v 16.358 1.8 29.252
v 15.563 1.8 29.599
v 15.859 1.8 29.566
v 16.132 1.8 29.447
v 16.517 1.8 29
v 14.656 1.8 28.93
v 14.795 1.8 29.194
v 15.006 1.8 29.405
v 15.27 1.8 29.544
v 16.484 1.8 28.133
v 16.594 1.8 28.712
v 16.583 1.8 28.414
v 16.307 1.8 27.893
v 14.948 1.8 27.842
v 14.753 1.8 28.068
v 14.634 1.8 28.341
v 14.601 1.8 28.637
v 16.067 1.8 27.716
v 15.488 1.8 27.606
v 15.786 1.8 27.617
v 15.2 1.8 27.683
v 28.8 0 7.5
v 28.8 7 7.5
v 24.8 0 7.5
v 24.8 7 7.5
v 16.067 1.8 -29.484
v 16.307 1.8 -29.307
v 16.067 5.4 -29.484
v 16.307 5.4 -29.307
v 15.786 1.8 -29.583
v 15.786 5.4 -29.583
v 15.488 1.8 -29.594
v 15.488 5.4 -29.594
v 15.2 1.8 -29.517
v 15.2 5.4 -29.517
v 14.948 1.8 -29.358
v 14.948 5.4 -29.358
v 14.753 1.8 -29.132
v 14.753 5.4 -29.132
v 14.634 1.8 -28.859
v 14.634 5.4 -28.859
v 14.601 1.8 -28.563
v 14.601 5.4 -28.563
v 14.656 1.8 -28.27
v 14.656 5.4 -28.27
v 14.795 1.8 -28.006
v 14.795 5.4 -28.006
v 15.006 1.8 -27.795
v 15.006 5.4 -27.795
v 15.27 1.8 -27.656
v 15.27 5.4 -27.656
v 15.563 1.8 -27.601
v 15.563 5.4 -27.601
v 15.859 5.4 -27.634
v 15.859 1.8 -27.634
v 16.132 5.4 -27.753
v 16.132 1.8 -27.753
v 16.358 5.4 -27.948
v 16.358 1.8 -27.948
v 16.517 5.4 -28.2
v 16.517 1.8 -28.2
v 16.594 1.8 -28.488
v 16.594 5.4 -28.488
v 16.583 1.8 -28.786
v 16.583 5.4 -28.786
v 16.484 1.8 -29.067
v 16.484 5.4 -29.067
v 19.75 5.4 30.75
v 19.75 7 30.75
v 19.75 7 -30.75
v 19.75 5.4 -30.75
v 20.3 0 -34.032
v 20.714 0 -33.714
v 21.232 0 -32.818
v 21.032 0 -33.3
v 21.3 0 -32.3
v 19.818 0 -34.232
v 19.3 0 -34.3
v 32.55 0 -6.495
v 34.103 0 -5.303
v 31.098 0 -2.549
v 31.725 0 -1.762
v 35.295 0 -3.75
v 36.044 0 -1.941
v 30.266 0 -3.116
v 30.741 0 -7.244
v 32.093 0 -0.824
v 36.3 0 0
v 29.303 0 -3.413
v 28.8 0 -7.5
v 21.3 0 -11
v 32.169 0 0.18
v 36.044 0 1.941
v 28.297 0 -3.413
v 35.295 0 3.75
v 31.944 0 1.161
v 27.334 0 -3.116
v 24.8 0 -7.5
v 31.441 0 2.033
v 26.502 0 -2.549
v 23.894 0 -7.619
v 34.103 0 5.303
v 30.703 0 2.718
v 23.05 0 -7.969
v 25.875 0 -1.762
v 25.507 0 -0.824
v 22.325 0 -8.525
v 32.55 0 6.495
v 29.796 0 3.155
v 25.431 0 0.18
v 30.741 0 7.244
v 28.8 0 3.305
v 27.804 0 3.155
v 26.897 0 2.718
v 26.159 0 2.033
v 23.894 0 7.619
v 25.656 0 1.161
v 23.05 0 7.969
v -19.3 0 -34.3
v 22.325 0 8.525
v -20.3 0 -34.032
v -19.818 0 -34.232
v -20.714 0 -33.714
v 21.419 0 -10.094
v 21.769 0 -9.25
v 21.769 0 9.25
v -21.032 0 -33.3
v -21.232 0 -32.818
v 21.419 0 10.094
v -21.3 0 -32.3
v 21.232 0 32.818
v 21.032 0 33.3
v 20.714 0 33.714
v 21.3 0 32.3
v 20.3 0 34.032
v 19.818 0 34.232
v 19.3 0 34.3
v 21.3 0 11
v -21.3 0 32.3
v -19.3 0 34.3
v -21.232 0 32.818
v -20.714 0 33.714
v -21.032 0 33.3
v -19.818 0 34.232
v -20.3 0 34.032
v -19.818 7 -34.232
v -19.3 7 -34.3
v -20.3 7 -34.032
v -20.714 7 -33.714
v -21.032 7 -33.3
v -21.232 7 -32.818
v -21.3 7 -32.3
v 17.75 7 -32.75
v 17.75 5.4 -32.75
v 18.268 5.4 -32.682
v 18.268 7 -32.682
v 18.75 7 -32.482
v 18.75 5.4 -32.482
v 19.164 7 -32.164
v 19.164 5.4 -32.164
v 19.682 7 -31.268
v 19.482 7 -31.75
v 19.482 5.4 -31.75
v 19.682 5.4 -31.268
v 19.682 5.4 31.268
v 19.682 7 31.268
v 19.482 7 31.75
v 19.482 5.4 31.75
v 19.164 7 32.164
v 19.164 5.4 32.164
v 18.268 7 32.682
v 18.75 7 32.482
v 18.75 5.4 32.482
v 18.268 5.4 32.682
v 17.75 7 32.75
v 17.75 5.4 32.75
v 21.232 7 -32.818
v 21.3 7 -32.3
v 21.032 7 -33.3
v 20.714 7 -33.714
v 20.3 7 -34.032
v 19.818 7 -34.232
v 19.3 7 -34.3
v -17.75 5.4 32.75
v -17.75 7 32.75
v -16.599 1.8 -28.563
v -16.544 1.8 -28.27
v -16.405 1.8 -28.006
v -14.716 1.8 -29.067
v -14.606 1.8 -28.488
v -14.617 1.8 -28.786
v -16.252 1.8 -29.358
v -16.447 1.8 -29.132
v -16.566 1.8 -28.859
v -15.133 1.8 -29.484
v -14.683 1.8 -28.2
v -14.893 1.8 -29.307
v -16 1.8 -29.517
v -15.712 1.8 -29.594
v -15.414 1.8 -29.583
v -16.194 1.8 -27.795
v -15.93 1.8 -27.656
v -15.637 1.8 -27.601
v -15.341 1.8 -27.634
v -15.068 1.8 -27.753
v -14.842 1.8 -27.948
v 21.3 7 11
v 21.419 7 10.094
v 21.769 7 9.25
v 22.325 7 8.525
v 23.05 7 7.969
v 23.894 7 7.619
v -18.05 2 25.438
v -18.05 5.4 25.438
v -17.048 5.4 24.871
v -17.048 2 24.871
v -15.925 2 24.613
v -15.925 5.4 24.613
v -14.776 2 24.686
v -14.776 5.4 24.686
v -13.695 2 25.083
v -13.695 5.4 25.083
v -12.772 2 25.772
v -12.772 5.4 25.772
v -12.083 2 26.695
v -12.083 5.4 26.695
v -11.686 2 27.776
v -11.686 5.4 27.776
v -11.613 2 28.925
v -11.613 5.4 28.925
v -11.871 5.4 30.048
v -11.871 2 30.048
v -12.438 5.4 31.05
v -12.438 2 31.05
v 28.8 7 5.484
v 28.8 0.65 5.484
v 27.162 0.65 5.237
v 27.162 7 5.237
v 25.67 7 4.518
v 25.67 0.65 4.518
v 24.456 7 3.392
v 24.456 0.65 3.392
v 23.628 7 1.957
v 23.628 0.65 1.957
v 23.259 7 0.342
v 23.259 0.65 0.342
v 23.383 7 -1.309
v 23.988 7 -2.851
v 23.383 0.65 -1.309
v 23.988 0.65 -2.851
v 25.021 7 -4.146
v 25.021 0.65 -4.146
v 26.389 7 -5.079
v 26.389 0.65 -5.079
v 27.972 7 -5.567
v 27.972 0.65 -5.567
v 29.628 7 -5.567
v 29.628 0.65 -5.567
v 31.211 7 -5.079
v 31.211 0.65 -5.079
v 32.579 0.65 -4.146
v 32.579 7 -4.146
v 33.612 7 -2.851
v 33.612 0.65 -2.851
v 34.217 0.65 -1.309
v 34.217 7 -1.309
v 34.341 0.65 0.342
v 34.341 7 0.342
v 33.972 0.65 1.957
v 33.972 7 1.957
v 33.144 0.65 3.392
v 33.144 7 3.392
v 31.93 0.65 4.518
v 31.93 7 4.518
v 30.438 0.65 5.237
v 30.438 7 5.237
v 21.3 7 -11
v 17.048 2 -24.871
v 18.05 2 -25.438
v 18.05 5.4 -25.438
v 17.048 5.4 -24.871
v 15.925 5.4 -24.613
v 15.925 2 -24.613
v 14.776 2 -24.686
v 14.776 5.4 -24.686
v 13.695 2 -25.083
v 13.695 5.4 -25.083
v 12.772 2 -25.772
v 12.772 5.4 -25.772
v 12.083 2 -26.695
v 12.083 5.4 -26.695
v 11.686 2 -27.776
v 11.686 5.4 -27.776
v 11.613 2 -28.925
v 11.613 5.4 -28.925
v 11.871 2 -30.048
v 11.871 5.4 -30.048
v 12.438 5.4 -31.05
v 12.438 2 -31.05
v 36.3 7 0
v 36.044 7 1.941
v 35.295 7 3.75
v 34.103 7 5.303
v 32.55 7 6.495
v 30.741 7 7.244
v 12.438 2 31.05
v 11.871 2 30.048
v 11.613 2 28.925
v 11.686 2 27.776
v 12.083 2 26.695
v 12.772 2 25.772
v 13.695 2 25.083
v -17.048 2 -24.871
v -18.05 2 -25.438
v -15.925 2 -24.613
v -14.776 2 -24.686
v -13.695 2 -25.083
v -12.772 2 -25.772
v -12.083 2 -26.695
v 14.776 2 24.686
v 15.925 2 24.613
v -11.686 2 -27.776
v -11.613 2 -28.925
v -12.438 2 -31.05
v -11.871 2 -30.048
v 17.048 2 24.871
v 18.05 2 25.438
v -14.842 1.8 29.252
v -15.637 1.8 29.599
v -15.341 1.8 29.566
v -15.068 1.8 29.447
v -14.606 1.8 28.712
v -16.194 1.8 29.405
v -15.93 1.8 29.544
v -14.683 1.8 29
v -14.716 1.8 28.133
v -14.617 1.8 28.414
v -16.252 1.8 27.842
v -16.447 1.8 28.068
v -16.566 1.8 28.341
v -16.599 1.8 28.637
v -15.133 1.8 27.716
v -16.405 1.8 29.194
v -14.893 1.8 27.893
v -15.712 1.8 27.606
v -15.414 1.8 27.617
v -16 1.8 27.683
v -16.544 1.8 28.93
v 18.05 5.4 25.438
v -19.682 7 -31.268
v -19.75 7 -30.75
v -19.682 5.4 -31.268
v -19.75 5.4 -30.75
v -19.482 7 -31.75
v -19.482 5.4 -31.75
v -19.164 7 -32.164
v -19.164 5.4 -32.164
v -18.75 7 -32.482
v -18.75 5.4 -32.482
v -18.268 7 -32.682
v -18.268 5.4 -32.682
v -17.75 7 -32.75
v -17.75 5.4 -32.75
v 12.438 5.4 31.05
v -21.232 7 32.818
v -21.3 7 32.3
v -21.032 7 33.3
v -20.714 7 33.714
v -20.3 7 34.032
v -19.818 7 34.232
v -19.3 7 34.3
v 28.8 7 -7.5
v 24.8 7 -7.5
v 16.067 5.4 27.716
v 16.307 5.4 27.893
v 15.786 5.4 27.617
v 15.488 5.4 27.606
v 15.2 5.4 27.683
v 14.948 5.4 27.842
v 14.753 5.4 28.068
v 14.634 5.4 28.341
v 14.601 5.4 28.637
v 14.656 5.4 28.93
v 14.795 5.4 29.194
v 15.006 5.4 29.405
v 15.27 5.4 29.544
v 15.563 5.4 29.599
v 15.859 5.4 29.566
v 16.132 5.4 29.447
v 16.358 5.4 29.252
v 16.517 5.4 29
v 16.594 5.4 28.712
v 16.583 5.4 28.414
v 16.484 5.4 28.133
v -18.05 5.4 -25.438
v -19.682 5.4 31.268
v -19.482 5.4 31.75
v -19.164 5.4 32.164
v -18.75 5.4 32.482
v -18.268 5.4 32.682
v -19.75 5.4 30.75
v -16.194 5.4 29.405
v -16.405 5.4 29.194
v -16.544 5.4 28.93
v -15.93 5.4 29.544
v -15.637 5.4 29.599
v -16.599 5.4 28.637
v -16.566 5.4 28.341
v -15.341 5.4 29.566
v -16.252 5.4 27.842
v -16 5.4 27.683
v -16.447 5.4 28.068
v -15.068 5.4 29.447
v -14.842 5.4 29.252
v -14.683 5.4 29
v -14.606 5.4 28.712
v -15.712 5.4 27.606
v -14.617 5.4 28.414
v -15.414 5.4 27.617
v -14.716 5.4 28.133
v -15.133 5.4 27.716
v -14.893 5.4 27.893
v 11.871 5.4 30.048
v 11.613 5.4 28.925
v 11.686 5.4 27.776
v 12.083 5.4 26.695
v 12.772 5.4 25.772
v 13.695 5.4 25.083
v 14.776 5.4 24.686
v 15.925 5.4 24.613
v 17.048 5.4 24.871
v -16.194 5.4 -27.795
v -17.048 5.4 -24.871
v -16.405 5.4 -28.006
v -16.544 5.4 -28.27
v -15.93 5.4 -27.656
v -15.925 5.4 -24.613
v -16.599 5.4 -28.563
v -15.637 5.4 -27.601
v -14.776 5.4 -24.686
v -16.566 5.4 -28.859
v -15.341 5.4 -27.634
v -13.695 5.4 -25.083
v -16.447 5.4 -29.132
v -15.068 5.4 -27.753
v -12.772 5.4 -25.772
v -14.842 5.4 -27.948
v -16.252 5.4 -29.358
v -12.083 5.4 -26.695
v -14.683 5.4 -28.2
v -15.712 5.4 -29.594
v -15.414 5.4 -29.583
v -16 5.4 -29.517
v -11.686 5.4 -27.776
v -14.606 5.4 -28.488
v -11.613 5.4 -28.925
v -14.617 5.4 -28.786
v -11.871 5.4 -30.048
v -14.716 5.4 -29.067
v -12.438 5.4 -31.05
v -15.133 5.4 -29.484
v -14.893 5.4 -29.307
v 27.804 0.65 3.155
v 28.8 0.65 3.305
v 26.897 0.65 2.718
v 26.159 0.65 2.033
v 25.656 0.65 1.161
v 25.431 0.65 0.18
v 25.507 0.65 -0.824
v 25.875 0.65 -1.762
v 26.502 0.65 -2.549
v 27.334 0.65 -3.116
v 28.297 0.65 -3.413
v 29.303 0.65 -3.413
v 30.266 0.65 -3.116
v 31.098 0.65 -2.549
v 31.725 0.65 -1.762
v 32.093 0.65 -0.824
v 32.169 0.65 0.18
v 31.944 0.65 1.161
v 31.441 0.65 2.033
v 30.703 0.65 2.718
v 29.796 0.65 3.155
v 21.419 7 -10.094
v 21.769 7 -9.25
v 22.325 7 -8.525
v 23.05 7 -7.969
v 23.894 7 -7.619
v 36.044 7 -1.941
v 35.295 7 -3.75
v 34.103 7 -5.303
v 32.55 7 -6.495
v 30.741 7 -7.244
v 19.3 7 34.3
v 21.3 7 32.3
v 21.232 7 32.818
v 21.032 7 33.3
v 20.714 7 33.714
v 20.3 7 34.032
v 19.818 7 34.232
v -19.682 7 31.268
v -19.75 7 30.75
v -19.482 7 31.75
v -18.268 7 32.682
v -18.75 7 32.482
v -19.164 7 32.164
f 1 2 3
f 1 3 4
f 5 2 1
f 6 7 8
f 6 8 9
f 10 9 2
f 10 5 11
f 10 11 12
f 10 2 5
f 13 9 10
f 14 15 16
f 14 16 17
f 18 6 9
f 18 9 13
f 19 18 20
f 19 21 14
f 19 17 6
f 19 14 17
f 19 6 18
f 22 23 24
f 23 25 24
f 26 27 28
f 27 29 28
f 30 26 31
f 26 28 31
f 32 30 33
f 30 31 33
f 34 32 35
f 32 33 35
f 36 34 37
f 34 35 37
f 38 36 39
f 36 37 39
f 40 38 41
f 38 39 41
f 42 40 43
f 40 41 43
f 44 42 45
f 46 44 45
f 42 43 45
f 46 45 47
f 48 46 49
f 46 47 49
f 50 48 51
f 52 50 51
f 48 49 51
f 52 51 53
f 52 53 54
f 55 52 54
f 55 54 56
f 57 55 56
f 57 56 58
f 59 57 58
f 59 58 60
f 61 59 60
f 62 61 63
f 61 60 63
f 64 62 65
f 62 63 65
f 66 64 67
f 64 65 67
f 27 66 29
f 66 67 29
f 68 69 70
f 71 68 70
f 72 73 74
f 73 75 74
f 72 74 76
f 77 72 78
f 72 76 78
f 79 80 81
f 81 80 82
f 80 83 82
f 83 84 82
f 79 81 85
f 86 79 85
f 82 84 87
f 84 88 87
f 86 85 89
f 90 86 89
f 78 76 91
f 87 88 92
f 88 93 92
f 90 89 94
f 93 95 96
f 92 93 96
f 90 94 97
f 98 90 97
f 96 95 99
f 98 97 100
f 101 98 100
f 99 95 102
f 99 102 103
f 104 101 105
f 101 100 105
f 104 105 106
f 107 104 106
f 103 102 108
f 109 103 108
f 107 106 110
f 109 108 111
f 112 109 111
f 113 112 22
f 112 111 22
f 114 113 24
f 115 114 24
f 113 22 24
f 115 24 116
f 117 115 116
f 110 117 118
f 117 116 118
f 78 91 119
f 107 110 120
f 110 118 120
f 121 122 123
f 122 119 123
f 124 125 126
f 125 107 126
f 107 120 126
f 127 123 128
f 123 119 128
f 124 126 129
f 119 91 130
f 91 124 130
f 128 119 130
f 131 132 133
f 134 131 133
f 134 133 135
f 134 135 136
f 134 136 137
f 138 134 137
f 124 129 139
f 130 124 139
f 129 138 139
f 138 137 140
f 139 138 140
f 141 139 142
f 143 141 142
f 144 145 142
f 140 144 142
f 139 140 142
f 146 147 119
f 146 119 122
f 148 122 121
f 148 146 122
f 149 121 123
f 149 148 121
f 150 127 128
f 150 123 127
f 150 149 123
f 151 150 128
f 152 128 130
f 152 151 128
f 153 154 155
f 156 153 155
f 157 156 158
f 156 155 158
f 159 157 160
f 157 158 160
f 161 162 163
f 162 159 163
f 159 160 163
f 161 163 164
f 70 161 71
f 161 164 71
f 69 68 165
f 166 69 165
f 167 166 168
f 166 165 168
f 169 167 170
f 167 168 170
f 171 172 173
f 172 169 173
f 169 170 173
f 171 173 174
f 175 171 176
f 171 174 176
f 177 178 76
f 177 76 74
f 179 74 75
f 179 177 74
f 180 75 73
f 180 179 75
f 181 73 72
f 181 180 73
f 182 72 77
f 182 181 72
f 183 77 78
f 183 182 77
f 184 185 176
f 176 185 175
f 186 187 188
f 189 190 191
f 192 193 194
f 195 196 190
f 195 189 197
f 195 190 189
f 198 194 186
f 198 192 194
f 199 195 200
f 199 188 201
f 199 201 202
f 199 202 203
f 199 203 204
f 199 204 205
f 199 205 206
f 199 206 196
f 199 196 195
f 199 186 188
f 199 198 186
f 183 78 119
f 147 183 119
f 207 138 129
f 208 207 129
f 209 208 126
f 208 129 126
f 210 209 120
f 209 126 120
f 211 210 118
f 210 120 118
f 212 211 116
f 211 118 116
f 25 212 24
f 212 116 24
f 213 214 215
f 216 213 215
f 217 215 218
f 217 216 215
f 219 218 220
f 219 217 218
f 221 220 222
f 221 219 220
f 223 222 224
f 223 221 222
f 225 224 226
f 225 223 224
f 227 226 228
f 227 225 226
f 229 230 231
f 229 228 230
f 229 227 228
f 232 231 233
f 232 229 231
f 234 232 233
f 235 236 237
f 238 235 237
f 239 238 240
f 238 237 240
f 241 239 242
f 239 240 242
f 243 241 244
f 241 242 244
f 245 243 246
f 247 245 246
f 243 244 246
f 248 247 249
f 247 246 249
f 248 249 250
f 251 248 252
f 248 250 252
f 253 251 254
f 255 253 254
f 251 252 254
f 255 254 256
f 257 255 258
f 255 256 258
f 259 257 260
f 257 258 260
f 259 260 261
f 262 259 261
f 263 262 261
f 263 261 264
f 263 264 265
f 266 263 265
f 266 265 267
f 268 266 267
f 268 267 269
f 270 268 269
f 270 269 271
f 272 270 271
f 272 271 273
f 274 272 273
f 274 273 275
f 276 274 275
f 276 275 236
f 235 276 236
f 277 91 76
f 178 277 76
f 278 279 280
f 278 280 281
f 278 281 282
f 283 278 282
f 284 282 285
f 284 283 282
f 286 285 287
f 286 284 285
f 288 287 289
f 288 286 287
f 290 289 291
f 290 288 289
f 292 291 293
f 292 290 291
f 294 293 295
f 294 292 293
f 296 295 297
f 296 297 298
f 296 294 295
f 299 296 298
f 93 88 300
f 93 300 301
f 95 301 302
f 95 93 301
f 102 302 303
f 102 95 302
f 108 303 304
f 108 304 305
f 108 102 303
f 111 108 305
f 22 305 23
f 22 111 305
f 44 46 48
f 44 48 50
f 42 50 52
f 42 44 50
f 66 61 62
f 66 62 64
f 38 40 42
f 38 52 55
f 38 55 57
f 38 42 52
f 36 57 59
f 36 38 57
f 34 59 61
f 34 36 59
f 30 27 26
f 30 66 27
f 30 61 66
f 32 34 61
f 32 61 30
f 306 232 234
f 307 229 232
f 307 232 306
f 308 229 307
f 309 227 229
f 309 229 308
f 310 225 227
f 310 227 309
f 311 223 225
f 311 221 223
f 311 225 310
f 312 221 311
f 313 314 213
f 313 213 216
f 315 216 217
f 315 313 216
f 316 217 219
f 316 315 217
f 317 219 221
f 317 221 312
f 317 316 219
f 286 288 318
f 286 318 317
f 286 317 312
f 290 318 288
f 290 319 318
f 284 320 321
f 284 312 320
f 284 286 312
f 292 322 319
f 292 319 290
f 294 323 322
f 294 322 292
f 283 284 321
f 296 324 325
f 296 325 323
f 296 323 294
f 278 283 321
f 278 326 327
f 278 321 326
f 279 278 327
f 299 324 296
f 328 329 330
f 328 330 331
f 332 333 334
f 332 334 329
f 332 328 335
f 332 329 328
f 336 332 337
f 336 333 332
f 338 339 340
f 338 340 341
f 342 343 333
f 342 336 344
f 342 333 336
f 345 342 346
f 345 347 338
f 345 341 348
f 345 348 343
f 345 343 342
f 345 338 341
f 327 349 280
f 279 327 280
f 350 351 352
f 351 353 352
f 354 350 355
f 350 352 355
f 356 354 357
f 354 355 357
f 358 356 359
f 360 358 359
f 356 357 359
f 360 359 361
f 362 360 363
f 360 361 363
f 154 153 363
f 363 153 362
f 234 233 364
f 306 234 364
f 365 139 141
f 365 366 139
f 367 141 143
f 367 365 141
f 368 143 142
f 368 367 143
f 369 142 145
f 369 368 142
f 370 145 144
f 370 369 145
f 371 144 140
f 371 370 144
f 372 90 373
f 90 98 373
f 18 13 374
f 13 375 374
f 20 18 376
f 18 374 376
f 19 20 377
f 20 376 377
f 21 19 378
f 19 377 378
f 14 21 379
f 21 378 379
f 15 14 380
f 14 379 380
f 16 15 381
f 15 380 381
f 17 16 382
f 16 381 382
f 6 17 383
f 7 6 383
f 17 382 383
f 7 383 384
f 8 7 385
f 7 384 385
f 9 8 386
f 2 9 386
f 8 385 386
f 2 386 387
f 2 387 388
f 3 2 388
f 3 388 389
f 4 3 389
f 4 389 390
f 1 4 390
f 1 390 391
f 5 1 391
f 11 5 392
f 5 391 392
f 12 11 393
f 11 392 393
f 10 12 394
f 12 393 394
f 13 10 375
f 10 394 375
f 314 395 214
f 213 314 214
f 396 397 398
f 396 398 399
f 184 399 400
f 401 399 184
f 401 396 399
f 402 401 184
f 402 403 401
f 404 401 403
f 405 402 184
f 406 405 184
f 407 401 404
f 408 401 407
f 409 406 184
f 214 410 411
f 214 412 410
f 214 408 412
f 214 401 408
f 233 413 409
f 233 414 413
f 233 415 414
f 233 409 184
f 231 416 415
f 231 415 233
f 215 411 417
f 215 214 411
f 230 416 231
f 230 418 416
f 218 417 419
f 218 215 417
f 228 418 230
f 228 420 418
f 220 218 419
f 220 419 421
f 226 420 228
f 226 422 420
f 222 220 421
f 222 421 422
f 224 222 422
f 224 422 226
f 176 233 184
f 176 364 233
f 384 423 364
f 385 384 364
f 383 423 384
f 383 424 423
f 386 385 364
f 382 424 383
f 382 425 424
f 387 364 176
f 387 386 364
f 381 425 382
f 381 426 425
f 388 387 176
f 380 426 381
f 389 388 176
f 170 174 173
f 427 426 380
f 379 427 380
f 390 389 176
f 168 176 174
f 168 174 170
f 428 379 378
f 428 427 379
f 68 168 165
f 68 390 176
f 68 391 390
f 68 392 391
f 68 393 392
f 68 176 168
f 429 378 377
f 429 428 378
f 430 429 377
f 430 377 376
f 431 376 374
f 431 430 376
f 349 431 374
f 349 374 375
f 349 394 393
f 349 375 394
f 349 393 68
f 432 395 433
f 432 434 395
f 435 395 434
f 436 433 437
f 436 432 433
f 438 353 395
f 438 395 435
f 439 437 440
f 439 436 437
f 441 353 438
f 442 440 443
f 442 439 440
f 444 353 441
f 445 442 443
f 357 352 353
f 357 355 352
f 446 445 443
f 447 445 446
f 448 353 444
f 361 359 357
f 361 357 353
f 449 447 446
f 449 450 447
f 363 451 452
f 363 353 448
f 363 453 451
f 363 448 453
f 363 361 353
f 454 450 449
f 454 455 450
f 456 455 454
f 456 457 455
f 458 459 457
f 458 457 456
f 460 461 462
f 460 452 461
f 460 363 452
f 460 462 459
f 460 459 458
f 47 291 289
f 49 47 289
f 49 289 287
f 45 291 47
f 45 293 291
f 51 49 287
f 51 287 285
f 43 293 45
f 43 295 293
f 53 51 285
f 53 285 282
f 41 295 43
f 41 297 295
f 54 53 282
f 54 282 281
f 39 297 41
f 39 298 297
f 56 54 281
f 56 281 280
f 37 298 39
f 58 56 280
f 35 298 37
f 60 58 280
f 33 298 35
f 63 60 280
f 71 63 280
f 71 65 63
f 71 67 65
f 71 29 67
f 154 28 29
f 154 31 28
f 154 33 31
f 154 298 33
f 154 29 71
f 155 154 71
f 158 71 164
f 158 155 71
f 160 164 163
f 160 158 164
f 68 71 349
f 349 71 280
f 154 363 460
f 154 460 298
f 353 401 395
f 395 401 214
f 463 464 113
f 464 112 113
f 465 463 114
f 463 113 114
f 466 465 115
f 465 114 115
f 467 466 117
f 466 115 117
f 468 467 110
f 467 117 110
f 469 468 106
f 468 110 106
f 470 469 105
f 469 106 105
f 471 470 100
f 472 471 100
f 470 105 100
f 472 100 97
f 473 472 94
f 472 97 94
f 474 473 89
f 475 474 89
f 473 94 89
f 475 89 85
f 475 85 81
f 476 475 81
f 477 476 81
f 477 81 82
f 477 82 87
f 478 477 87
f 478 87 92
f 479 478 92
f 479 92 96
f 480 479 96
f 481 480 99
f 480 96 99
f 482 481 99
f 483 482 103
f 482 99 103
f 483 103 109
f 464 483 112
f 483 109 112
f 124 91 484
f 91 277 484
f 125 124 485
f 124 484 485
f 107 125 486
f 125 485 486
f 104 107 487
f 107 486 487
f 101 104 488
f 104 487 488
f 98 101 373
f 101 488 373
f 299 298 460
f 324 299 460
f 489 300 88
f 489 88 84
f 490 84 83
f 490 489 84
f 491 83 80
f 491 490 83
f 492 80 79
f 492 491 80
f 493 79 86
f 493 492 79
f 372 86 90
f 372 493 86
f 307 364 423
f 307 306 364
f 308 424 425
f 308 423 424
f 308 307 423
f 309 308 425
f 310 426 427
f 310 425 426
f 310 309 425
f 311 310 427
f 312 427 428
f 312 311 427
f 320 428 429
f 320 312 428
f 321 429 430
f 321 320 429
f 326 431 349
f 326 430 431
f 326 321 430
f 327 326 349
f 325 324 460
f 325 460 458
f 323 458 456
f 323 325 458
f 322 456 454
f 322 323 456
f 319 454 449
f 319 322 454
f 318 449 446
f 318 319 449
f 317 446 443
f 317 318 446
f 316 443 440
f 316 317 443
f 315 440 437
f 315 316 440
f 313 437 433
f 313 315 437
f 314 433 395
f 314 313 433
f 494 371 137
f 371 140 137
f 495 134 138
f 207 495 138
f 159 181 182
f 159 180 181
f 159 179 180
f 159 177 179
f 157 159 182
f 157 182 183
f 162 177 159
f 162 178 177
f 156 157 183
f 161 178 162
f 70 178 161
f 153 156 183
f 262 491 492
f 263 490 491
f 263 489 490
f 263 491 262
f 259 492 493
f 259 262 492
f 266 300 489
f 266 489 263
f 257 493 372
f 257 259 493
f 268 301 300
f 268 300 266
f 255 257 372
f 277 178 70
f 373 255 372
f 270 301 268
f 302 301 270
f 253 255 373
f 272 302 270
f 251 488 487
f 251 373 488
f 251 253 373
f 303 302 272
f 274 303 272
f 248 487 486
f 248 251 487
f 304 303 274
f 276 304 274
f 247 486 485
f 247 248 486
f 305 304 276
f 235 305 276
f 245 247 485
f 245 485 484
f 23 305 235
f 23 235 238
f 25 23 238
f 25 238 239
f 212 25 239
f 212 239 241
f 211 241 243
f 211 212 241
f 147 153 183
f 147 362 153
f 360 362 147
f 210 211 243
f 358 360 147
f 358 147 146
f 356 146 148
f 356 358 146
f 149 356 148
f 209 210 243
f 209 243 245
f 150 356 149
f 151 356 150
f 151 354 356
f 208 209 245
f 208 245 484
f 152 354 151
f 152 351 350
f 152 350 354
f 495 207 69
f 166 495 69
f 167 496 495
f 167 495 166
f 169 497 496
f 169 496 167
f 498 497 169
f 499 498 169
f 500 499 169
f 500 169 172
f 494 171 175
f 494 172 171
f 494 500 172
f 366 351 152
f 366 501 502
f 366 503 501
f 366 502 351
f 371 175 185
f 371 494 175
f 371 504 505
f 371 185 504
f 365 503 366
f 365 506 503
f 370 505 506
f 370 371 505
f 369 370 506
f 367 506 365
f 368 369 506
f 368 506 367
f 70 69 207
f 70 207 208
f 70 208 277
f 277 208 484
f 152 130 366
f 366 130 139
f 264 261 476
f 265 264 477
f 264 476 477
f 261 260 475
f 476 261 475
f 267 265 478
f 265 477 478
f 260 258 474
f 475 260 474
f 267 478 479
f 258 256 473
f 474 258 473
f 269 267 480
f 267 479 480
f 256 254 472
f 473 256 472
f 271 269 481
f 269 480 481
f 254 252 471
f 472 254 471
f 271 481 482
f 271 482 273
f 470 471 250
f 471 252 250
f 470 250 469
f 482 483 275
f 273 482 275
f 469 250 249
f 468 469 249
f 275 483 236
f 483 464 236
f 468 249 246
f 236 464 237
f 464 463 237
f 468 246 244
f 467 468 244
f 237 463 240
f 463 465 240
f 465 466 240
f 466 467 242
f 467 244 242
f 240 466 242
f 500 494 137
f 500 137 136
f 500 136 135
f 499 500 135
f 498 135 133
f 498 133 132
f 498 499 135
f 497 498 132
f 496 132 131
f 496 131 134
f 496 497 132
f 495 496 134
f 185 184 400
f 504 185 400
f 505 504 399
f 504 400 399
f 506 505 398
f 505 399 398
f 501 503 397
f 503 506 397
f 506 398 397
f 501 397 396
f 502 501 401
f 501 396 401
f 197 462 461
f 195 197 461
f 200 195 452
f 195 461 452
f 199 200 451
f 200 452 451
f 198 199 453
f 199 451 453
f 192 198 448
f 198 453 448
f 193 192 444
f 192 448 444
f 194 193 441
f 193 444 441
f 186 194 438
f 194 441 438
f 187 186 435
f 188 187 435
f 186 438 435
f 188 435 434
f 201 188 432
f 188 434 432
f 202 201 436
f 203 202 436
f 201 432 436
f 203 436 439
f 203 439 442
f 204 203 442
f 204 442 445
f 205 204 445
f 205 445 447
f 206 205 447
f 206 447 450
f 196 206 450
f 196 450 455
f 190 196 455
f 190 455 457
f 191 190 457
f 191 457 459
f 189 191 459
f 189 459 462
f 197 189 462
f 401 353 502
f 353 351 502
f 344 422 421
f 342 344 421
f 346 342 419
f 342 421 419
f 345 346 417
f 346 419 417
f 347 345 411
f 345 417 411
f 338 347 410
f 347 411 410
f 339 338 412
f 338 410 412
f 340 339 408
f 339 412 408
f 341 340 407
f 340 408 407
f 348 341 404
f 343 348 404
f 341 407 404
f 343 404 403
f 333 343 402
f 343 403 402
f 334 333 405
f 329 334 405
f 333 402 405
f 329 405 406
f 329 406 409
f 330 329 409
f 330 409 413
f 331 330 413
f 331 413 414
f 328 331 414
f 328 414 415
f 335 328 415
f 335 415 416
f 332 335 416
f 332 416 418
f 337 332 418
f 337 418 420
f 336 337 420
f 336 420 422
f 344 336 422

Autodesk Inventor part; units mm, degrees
ref_plane "YZ Plane" through (0, 0, 0) normal (1, 0, 0) x (0, 1, 0)
ref_plane "XZ Plane" through (0, 0, 0) normal (0, 1, 0) x (-1, 0, 0)
ref_plane "XY Plane" through (0, 0, 0) normal (0, 0, 1) x (1, 0, 0)
sketch "Sketch1" plane through (0, 0, 0) normal (0, 1, 0) x (-1, 0, 0)
  line L0 (21.3, 34.3) -> (-21.3, 34.3)
  line L1 (-21.3, 34.3) -> (-21.3, -34.3)
  line L2 (-21.3, -34.3) -> (21.3, -34.3)
  line L3 (21.3, -34.3) -> (21.3, 34.3)
  line L4 (21.3, 34.3) -> (-21.3, -34.3) construction
  line L5 (-21.3, 34.3) -> (21.3, -34.3) construction
  point P0 (0, 0)
  dimension "d0" = 42.6
  dimension "d1" = 68.6
extrude "Extrusion1" add sketch "Sketch1" along normal blind 7
sketch "Sketch2" plane through (0, 7, 0) normal (0, 1, 0) x (1, 0, 0)
  line L0 (-19.75, -32.75) -> (19.75, -32.75)
  line L1 (19.75, -32.75) -> (19.75, 32.75)
  line L2 (19.75, 32.75) -> (-19.75, 32.75)
  line L3 (-19.75, 32.75) -> (-19.75, -32.75)
  line L4 (-19.75, -32.75) -> (19.75, 32.75) construction
  line L5 (19.75, -32.75) -> (-19.75, 32.75) construction
  point P0 (0, 0)
  dimension "d4" = 39.5
  dimension "d5" = 65.5
extrude "Extrusion2" cut sketch "Sketch2" against normal blind 1.6
sketch "Sketch3" plane through (0, 5.4, 0) normal (0, 1, 0) x (1, 0, 0)
  line L0 (-18.05, -31.05) -> (18.05, -31.05)
  line L1 (18.05, -31.05) -> (18.05, 31.05)
  line L2 (18.05, 31.05) -> (-18.05, 31.05)
  line L3 (-18.05, 31.05) -> (-18.05, -31.05)
  line L4 (-18.05, -31.05) -> (18.05, 31.05) construction
  line L5 (18.05, -31.05) -> (-18.05, 31.05) construction
  point P0 (0, 0)
  dimension "d8" = 36.1
  dimension "d9" = 62.1
extrude "Extrusion3" cut sketch "Sketch3" against normal blind 3.4
sketch "Sketch4" plane through (0, 2, 0) normal (0, 1, 0) x (1, 0, 0)
  circle A0 centre (-15.6, 28.6) radius 4
  circle A1 centre (15.6, 28.6) radius 4
  circle A2 centre (-15.6, -28.6) radius 4
  circle A3 centre (15.6, -28.6) radius 4
  line L0 (-18.05, 31.05) -> (18.05, 31.05) projected
  line L1 (-18.05, -31.05) -> (-18.05, 31.05) projected
  point P0 (0, 0)
  dimension "d12" = 31.2
  dimension "d13" = 31.2
  dimension "d14" = 57.2
  dimension "d15" = 57.2
  dimension "d16" = 8
  dimension "d17" = 8
  dimension "d18" = 8
  dimension "d19" = 8
  dimension "d22" = 0
  dimension "d23" = 15.6
  dimension "d24" = 28.6
  dimension "d25" = 0
extrude "Extrusion4" add sketch "Sketch4" along normal blind 3.4
sketch "Sketch5" plane through (-15.6, 5.4, -28.6) normal (0, 1, 0) x (0.7071068, 0, -0.7071068)
  arc A0 (-3.9682, -0.5034) -> (3.9682, -0.5034) centre (0, 0) ccw projected
  circle A1 centre (0, 0) radius 1
  arc A2 (21.5584, -18.0935) -> (21.5584, -26.0299) centre (22.0617, -22.0617) ccw projected
  circle A3 centre (22.0617, -22.0617) radius 1
  arc A4 (-14.4166, -62.0049) -> (-22.353, -62.0049) centre (-18.3848, -62.5082) ccw projected
  circle A5 centre (-18.3848, -62.5082) radius 1
  arc A6 (-39.9431, -44.4147) -> (-39.9431, -36.4783) centre (-40.4465, -40.4465) ccw projected
  circle A7 centre (-40.4465, -40.4465) radius 1
  point P0 (-9.1924, -31.2541)
  point P1 (-0.6856, -2.9206)
  point P2 (0.6856, -2.9206)
  point P3 (-24.8409, 22.606)
  point P4 (-24.8409, 21.2347)
  point P5 (19.0704, 65.146)
  point P6 (17.6991, 65.146)
  dimension "d28" = 2
  dimension "d29" = 2
  dimension "d30" = 2
  dimension "d31" = 2
extrude "Extrusion5" cut sketch "Sketch5" against normal blind 3.6
fillet "Fillet3" radius 2 8 edges at (-19.75, 6.2, -32.75) (19.75, 6.2, -32.75) (-19.75, 6.2, 32.75) (19.75, 6.2, 32.75) (-21.3, 3.5, -34.3) (-21.3, 3.5, 34.3) (21.3, 3.5, 34.3) (21.3, 3.5, -34.3)
sketch "Sketch8" plane through (21.3, 0, 32.3) normal (1, 0, 0) x (0, 0, -1)
  line L0 (63.05, 7) -> (1.55, 7) projected
  line L1 (0, 0) -> (64.6, 0) projected
  line L2 (39.8, 7) -> (24.8, 7)
  line L3 (24.8, 7) -> (24.8, 0)
  line L4 (24.8, 0) -> (39.8, 0)
  line L5 (39.8, 0) -> (39.8, 7)
  point P0 (32.3, 0)
  point P1 (39.8, 0)
  point P2 (24.8, 7)
  dimension "d49" = 15
  dimension "d50" = 7.5
extrude "Extrusion7" add sketch "Sketch8" along normal blind 15
sketch "Sketch9" plane through (0, 7, 0) normal (0, 1, 0) x (1, 0, 0)
  line L0 (36.3, 7.5) -> (36.3, -7.5) projected
  point P0 (0, 0)
  point P1 (28.8, 0.0728)
  dimension "d60" = 7.5
hole "Hole2" at (28.8, 7, -0.0728) direction (0, -1, 0) diameter 6.756 end through all counterbore diameter 11.113 counterbore depth 6.35 clearance for "Socket Head Cap Screw" size "1/4" standard "Ansi Unified Screw Threads"
fillet "Fillet4" radius 3.5 2 edges at (21.3, 3.5, -7.5) (21.3, 3.5, 7.5)
fillet "Fillet5" radius 7.5 2 edges at (36.3, 3.5, 7.5) (36.3, 3.5, -7.5)
equation "\"d13\" = d12"
equation "\"d14\" = d15"
equation "\"d23\" = 0.5 * d12"
equation "\"d24\" = 0.5 * d15"
equation "\"d50\" = 0.5 * d49"
properties part number "Thermister_Amp_Mount"
